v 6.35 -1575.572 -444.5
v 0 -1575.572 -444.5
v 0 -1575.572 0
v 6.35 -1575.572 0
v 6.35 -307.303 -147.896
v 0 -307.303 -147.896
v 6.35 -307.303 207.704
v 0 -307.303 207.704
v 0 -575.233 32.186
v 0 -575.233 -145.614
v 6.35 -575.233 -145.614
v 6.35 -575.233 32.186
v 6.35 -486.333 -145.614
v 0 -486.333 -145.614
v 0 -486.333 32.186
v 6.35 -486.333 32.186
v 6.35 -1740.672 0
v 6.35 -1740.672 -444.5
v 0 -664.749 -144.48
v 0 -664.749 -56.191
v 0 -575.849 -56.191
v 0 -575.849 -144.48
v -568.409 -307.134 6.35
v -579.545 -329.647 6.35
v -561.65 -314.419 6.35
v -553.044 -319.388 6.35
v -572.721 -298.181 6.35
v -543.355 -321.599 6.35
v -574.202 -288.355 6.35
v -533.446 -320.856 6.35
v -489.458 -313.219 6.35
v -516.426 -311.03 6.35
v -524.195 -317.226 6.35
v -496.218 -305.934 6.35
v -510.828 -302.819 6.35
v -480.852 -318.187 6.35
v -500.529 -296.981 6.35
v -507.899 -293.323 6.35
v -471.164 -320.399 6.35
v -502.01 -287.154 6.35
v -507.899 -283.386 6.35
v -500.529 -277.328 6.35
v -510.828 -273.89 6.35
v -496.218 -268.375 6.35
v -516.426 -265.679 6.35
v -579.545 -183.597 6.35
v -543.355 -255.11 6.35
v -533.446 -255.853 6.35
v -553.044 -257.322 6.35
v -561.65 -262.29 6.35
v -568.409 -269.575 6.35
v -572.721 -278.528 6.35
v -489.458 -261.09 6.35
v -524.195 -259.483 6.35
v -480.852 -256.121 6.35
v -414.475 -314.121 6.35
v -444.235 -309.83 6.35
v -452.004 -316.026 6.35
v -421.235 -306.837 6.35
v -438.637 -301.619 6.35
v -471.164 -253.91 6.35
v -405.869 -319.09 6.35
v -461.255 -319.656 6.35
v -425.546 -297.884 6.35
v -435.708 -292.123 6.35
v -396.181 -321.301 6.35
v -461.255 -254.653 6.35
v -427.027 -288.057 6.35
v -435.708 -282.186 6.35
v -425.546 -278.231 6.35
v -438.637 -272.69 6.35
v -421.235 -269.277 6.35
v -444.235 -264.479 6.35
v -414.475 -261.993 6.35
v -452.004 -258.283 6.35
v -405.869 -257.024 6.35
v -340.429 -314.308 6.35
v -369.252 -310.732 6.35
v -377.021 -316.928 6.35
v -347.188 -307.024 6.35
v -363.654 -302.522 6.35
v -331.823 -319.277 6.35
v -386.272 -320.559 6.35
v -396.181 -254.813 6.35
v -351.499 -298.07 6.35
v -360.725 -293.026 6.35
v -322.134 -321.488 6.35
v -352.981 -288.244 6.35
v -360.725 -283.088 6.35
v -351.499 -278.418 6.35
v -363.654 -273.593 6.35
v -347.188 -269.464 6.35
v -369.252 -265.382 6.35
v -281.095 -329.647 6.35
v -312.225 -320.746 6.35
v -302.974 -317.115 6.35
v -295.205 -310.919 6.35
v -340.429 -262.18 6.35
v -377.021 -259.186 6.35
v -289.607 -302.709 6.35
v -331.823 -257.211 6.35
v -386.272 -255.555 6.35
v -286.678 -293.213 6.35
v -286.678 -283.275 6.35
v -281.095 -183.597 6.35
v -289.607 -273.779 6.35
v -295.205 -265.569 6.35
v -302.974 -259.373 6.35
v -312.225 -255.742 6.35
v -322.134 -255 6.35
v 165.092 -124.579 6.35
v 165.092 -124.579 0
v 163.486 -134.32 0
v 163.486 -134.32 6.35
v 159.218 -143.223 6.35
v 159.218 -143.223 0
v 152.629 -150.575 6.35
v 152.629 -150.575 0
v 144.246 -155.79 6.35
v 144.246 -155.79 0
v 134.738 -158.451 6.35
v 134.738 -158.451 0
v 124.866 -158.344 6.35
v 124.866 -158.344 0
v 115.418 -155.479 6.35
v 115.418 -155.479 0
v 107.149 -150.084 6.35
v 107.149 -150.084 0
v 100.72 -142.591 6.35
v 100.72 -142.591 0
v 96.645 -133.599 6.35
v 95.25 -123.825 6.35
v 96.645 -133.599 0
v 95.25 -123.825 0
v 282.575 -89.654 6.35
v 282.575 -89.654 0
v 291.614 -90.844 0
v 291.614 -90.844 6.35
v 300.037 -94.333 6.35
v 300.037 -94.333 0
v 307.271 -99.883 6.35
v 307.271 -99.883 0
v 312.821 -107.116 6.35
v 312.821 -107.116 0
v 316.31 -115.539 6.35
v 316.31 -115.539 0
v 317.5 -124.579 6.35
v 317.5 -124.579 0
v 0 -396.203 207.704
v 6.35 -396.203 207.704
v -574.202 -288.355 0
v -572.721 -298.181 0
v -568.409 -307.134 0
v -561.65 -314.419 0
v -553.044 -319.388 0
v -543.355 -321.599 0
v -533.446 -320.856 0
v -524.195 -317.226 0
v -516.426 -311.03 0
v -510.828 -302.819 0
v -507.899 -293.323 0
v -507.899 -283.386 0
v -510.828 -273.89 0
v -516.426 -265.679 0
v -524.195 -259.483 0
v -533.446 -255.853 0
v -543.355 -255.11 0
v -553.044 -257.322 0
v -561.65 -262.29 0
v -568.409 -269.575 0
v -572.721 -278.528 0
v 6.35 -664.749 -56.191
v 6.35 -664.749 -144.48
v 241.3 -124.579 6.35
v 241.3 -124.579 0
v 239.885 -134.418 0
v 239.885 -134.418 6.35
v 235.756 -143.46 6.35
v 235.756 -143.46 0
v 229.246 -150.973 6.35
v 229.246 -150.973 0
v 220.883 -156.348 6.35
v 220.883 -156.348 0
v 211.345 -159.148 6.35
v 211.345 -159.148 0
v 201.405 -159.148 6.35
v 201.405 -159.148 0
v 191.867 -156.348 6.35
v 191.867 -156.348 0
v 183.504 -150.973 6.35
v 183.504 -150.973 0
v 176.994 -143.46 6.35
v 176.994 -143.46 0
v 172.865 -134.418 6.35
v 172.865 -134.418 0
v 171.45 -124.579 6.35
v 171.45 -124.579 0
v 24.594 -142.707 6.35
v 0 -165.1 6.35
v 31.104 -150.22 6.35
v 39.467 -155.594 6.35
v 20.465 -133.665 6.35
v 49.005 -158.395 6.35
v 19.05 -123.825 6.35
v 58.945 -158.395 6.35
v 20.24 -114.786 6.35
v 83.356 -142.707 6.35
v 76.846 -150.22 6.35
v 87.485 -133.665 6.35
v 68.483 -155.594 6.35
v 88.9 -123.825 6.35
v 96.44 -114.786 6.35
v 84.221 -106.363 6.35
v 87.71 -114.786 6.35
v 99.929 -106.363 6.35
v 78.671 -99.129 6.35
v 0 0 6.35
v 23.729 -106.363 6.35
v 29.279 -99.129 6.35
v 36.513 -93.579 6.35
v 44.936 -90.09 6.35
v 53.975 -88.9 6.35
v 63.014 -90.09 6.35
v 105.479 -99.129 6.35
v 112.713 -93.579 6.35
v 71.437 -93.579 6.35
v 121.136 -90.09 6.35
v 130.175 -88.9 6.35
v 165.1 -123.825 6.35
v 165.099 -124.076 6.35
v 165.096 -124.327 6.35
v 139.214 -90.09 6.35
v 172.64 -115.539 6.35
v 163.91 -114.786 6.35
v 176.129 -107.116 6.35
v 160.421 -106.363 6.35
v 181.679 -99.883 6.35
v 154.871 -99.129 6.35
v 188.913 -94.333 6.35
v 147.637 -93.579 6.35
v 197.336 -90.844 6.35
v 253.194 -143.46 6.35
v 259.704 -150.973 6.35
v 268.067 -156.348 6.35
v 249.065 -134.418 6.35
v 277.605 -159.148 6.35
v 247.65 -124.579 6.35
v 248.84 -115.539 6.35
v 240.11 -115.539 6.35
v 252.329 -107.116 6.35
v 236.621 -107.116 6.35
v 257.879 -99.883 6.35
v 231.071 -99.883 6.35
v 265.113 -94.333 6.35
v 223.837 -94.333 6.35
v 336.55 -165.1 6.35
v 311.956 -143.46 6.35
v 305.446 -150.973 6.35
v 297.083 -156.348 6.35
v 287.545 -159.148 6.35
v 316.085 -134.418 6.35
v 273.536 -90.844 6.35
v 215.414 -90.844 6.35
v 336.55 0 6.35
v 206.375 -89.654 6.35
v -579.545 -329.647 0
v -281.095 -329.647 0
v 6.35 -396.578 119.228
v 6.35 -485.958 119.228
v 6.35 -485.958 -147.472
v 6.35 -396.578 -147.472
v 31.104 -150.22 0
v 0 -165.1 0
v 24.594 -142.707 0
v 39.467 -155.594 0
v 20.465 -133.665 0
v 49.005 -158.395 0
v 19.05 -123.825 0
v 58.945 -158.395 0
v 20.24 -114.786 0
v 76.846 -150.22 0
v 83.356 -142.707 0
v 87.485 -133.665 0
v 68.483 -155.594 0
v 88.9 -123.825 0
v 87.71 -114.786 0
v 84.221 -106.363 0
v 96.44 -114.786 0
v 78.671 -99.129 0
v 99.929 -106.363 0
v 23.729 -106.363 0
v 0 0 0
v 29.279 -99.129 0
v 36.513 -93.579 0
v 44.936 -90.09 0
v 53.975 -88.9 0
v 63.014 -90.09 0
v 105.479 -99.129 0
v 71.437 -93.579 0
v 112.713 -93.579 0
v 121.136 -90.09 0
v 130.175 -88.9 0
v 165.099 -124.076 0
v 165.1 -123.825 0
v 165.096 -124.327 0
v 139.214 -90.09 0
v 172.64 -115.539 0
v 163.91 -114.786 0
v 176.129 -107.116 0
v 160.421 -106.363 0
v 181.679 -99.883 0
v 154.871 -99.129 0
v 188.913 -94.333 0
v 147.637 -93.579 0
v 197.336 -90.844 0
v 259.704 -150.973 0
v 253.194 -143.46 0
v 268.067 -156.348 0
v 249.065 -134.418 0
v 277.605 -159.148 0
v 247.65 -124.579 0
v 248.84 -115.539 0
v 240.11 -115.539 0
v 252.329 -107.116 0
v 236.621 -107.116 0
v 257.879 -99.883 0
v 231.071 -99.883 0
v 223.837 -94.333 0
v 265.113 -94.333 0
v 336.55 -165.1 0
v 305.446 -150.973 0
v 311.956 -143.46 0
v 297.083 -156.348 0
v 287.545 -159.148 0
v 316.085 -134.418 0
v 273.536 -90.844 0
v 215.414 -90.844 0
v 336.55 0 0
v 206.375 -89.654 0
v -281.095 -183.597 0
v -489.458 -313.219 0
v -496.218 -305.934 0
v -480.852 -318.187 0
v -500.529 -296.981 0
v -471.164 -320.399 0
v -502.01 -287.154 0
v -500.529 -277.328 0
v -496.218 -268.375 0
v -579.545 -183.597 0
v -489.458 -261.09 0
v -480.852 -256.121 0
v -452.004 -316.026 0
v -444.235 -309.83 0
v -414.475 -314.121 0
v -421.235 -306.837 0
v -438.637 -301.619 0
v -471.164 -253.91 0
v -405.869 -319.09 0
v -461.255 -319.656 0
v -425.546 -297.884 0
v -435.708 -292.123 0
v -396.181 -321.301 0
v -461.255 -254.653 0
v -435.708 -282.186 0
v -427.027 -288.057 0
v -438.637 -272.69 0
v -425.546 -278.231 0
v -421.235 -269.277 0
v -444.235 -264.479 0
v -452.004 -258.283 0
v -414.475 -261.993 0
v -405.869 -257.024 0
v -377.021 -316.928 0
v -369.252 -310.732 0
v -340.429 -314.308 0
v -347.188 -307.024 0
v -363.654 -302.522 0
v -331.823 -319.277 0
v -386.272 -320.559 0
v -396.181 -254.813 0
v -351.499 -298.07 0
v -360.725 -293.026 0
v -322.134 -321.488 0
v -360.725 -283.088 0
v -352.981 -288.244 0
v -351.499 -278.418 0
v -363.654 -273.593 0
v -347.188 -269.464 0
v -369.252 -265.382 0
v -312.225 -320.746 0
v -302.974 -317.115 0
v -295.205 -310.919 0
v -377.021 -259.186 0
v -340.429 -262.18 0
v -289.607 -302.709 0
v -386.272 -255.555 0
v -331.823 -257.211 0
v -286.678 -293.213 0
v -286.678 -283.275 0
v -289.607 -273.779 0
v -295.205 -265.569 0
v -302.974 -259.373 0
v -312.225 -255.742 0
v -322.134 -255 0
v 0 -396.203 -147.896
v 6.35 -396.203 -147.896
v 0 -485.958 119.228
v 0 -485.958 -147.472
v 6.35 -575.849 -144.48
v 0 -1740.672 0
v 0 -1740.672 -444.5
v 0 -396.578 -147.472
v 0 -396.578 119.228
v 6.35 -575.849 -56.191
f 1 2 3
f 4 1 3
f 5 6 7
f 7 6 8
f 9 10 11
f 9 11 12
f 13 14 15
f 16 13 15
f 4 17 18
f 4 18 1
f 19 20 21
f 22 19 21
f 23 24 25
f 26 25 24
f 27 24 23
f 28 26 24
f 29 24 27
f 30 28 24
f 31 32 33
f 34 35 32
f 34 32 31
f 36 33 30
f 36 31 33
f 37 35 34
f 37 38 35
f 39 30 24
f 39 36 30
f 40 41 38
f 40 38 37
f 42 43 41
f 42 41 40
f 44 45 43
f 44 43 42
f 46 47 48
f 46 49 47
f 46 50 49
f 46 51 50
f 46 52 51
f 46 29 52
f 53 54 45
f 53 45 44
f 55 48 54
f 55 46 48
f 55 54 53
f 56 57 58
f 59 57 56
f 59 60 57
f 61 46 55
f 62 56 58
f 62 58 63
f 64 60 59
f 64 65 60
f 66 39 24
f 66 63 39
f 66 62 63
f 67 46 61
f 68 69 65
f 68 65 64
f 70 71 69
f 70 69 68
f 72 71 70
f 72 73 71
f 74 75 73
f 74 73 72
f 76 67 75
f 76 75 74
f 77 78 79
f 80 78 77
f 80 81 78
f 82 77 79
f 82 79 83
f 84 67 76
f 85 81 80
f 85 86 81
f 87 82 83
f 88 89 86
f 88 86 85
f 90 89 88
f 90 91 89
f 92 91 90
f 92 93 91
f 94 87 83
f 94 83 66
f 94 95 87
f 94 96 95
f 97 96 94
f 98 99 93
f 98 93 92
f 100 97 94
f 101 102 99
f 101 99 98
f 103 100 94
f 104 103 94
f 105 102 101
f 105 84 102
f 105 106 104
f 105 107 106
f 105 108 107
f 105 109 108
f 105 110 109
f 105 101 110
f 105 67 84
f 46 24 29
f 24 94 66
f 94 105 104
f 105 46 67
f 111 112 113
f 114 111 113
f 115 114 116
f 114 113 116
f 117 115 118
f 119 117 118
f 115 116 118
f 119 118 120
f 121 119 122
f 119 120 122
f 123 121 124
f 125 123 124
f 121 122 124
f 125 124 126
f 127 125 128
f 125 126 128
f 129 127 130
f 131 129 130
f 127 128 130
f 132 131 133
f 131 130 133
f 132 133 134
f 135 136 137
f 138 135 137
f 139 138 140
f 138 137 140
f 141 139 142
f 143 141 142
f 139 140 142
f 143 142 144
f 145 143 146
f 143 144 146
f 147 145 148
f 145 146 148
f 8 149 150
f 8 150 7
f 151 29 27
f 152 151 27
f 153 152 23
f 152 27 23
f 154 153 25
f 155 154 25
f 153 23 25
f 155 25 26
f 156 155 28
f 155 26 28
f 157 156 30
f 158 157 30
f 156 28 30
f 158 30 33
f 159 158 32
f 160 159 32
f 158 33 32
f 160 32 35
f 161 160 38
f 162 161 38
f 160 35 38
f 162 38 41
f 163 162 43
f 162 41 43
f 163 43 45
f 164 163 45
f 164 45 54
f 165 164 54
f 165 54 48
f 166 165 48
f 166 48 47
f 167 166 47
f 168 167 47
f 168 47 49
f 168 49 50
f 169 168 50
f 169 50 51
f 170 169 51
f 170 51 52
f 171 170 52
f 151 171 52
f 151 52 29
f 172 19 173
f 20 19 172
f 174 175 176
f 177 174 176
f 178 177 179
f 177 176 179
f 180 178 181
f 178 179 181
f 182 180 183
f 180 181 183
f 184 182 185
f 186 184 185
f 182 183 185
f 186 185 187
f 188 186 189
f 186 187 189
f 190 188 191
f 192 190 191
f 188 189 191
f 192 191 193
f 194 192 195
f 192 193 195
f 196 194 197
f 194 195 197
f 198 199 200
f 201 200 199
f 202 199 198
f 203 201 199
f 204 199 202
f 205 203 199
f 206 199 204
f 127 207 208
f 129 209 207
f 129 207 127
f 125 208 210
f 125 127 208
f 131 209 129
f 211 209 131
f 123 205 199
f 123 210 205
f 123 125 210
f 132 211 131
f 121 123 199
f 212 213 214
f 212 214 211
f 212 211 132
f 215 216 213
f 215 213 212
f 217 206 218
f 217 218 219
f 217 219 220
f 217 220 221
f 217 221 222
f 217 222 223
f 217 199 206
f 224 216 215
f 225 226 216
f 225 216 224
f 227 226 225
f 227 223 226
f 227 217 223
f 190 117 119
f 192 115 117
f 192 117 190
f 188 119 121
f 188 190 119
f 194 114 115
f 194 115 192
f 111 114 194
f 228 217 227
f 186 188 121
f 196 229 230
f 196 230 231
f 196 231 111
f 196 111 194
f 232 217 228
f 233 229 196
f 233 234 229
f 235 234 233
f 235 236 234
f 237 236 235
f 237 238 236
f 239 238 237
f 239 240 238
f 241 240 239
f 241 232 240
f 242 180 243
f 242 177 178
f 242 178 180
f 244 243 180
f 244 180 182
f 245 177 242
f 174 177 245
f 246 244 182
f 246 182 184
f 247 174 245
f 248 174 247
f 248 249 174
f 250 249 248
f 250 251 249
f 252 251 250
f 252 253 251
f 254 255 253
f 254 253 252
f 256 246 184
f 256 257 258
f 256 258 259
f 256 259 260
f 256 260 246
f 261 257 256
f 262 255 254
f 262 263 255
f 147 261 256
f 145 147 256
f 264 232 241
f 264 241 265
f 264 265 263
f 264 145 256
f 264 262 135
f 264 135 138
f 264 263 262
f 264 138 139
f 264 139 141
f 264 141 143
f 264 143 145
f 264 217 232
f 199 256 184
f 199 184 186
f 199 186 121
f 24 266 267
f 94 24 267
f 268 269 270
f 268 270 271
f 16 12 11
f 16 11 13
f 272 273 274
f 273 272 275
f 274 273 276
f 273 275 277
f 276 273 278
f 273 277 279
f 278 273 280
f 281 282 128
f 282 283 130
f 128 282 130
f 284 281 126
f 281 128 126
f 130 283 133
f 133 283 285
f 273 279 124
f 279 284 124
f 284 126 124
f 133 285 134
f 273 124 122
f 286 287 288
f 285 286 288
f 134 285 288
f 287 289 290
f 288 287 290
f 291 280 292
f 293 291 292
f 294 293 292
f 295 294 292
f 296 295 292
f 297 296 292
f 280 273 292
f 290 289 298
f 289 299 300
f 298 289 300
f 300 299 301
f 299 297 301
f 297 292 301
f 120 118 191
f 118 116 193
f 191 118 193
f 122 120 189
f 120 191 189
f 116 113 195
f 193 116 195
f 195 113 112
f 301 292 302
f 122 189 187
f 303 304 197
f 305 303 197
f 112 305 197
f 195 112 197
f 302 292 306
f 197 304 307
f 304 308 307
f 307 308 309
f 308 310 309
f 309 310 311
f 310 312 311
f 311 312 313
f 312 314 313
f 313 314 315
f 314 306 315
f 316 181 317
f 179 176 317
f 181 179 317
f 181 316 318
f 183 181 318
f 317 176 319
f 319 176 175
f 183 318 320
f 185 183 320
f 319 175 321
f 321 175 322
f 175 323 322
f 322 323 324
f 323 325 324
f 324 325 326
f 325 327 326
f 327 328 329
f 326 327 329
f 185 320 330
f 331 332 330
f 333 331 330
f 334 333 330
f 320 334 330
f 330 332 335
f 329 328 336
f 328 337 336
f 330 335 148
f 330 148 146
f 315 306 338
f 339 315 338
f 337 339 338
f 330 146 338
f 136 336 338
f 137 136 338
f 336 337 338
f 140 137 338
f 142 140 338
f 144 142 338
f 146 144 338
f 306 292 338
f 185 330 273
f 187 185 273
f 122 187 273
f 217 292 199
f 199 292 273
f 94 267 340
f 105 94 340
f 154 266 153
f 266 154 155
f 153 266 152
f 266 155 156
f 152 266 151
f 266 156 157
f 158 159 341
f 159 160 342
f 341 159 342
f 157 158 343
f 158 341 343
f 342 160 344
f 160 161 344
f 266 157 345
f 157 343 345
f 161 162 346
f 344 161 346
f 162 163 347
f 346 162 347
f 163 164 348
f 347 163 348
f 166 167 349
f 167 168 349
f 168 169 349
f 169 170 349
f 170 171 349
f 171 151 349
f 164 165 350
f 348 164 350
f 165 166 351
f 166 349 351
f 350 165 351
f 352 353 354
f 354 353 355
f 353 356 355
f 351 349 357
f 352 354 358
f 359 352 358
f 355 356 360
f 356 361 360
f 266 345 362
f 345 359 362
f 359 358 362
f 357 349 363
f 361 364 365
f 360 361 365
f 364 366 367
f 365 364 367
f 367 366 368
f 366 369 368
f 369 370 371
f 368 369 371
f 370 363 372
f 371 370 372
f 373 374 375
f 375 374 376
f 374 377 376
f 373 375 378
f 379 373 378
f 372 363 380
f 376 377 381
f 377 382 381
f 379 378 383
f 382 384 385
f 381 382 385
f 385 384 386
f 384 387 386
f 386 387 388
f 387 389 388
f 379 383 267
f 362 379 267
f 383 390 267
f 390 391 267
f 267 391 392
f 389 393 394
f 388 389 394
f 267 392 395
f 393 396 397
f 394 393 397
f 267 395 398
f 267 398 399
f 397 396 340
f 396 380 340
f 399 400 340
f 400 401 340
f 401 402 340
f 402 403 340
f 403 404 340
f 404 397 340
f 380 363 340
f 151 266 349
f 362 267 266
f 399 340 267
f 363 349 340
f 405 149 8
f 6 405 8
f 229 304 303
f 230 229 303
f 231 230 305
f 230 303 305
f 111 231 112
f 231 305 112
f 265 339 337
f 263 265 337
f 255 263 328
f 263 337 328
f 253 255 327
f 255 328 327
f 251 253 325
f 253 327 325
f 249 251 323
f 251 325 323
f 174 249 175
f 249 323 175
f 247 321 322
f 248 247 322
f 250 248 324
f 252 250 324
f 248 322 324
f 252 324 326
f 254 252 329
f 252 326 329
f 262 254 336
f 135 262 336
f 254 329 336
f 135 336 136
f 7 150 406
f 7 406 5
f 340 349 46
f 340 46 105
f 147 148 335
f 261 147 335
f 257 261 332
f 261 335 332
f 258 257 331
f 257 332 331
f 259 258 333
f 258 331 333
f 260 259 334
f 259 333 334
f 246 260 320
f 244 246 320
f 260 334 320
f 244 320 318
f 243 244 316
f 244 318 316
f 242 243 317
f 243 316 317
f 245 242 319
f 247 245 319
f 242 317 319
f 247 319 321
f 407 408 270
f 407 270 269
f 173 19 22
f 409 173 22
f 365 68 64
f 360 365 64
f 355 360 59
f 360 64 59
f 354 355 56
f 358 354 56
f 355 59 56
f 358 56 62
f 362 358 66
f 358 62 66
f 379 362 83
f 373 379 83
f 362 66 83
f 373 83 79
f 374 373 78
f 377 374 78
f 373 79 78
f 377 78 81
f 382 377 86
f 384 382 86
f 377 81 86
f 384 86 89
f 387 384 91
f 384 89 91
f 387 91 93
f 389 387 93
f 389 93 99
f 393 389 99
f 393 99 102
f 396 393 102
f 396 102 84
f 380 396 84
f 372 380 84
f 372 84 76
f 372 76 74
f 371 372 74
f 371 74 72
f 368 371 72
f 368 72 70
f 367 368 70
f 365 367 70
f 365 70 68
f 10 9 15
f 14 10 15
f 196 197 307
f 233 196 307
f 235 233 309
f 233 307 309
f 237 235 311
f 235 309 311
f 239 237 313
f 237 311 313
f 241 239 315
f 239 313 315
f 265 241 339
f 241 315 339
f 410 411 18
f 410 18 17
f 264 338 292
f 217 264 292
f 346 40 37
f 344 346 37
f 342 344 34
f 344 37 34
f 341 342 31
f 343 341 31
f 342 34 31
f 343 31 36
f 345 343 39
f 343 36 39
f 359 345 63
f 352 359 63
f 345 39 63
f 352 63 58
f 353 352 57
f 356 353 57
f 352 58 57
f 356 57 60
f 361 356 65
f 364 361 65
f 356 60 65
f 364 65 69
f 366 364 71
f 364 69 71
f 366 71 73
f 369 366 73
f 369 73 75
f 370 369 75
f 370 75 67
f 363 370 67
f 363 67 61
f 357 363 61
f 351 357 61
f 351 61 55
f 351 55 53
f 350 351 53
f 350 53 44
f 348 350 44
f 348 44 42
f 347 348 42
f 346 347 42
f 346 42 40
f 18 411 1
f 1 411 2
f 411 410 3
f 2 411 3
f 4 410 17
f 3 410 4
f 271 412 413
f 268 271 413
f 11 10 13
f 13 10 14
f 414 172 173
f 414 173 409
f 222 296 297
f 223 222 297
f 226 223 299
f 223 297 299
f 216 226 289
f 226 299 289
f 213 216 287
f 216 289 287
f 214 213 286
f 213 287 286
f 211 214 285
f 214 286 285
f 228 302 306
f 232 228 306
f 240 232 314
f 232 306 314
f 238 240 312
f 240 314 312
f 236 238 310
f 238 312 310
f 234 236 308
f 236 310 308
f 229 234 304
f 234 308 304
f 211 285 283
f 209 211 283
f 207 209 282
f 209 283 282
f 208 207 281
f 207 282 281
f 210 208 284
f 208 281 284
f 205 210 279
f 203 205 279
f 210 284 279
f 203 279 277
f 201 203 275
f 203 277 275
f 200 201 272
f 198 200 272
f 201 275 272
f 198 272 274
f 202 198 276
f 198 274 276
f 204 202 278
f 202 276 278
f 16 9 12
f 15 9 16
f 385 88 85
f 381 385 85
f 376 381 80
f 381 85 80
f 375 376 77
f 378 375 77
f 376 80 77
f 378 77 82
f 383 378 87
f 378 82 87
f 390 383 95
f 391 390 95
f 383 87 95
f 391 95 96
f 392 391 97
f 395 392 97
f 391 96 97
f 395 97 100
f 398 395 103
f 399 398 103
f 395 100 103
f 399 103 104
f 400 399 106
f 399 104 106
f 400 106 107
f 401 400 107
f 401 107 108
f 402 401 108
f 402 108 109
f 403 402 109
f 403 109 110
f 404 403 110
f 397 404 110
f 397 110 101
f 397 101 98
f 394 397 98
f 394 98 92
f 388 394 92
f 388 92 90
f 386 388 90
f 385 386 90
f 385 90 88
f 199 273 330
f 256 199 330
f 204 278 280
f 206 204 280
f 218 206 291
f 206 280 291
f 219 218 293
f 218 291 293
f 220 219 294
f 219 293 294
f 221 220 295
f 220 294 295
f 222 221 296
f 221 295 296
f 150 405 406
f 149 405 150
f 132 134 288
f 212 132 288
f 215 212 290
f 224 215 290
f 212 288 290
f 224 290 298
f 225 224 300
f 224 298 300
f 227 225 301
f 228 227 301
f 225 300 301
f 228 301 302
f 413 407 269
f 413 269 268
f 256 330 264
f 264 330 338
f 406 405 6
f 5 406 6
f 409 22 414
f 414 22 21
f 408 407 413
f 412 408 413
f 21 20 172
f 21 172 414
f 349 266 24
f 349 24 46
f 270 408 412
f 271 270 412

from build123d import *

# Parameters (mm, degrees)
F1_DEPTH  = 6.35
F6_W      = 165.1
F6_H      = 444.5
F7_DEPTH  = 6.35
F5_W      = 88.9
F5_H      = 88.2889601485
F4_W      = 88.9000443962
F4_H      = 177.8
F3_W      = 89.3805209971
F3_H      = 266.7
F2_W      = 88.9
F2_H      = 355.6
F8_W      = 298.45
F8_H      = 146.05
F10_DEPTH = 6.35
F11_D     = 66.675
F11_DEPTH = 12.7
F11_TIP   = 20.0311908868


with BuildPart() as f1:
    # F0 (on Top) → F1 (new body)
    with BuildSketch(Plane.XY):
        Polygon((336.55, 0), (0, 0), (0, -82.55), (53.975, -82.55), (130.175, -82.55), (206.375, -82.55), (282.575, -82.55), (336.55, -82.55), align=None)
        with BuildLine():
            Line((53.975, -82.55), (0, -82.55))
            Line((0, -82.55), (0, -123.825))
            Line((0, -123.825), (19.05, -123.825))
            ThreePointArc((19.05, -123.825), (29.2792956671, -99.1292956671), (53.975, -88.9))
            Line((53.975, -88.9), (53.975, -82.55))
        make_face()
        with BuildLine():
            Line((130.175, -82.55), (53.975, -82.55))
            Line((53.975, -82.55), (53.975, -88.9))
            ThreePointArc((53.975, -88.9), (78.6707043329, -99.1292956671), (88.9, -123.825))
            Line((88.9, -123.825), (95.25, -123.825))
            ThreePointArc((95.25, -123.825), (105.4792956671, -99.1292956671), (130.175, -88.9))
            Line((130.175, -88.9), (130.175, -82.55))
        make_face()
        with BuildLine():
            Line((206.375, -82.55), (130.175, -82.55))
            Line((130.175, -82.55), (130.175, -88.9))
            ThreePointArc((130.175, -88.9), (154.8707043329, -99.1292956671), (165.1, -123.825))
            ThreePointArc((165.1, -123.825), (165.0979670337, -124.2018269662), (165.0918683715, -124.5786100626))
            Line((165.0918683715, -124.5786100626), (171.45, -124.5786100626))
            ThreePointArc((171.45, -124.5786100626), (181.6792956671, -99.8829057297), (206.375, -89.6536100626))
            Line((206.375, -89.6536100626), (206.375, -82.55))
        make_face()
        with BuildLine():
            Line((282.575, -89.6536100626), (282.575, -82.55))
            Line((282.575, -82.55), (206.375, -82.55))
            Line((206.375, -82.55), (206.375, -89.6536100626))
            ThreePointArc((206.375, -89.6536100626), (231.0707043329, -99.8829057297), (241.3, -124.5786100626))
            Line((241.3, -124.5786100626), (247.65, -124.5786100626))
            ThreePointArc((247.65, -124.5786100626), (257.8792956671, -99.8829057297), (282.575, -89.6536100626))
        make_face()
        with BuildLine():
            Line((336.55, -165.1), (336.55, -82.55))
            Line((336.55, -82.55), (282.575, -82.55))
            Line((282.575, -82.55), (282.575, -89.6536100626))
            ThreePointArc((282.575, -89.6536100626), (307.2707043329, -99.8829057297), (317.5, -124.5786100626))
            ThreePointArc((317.5, -124.5786100626), (282.575, -159.5036100626), (247.65, -124.5786100626))
            Line((247.65, -124.5786100626), (241.3, -124.5786100626))
            ThreePointArc((241.3, -124.5786100626), (206.375, -159.5036100626), (171.45, -124.5786100626))
            Line((171.45, -124.5786100626), (165.0918683715, -124.5786100626))
            ThreePointArc((165.0918683715, -124.5786100626), (129.7981730338, -158.7479670337), (95.25, -123.825))
            Line((95.25, -123.825), (88.9, -123.825))
            ThreePointArc((88.9, -123.825), (53.975, -158.75), (19.05, -123.825))
            Line((19.05, -123.825), (0, -123.825))
            Line((0, -123.825), (0, -165.1))
            Line((0, -165.1), (336.55, -165.1))
        make_face()
    extrude(amount=F1_DEPTH)


with BuildPart() as f7:
    # F6 (on Right) → F7 (new body)
    with BuildSketch(Plane.YZ):
        with Locations((-1658.1222646861, -222.25)):
            Rectangle(F6_W, F6_H)
    extrude(amount=F7_DEPTH)


with BuildPart() as f7b:
    # F5 (on Right) → F7, piece 2 (new body)
    with BuildSketch(Plane.YZ):
        with Locations((-620.298653841, -100.3352551937)):
            Rectangle(F5_W, F5_H)
    extrude(amount=F7_DEPTH)


with BuildPart() as f7c:
    # F4 (on Right) → F7, piece 3 (new body)
    with BuildSketch(Plane.YZ):
        with Locations((-530.7833552361, -56.7137598991)):
            Rectangle(F4_W, F4_H)
    extrude(amount=F7_DEPTH)


with BuildPart() as f7d:
    # F3 (on Right) → F7, piece 4 (new body)
    with BuildSketch(Plane.YZ):
        with Locations((-441.2680566311, -14.121811837)):
            Rectangle(F3_W, F3_H)
    extrude(amount=F7_DEPTH)


with BuildPart() as f7e:
    # F2 (on Right) → F7, piece 5 (new body)
    with BuildSketch(Plane.YZ):
        with Locations((-351.7527729273, 29.9040375065)):
            Rectangle(F2_W, F2_H)
    extrude(amount=F7_DEPTH)


with BuildPart() as f10:
    # F8 (on Top) → F10 (new body)
    with BuildSketch(Plane.XY):
        with Locations((-430.3200393915, -256.6215630923)):
            Rectangle(F8_W, F8_H)
    extrude(amount=F10_DEPTH)

    # F11
    with Locations(Plane(origin=(0, 0, 0), x_dir=(1, 0, 0), z_dir=(0, 0, -1))):
        with Locations((-540.8641432916, 288.3545416575), (-468.6728927806, 287.1544628373), (-393.6898868663, 288.0571330201), (-319.6430068752, 288.2440111145)):
            Hole(F11_D / 2, depth=F11_DEPTH)
            with Locations((0, 0, -(F11_DEPTH + F11_TIP / 2))):  # 118° drill point
                Cone(0, F11_D / 2, F11_TIP, mode=Mode.SUBTRACT)


solid = Compound([f1.part, f7.part, f7b.part, f7c.part, f7d.part, f7e.part, f10.part])
